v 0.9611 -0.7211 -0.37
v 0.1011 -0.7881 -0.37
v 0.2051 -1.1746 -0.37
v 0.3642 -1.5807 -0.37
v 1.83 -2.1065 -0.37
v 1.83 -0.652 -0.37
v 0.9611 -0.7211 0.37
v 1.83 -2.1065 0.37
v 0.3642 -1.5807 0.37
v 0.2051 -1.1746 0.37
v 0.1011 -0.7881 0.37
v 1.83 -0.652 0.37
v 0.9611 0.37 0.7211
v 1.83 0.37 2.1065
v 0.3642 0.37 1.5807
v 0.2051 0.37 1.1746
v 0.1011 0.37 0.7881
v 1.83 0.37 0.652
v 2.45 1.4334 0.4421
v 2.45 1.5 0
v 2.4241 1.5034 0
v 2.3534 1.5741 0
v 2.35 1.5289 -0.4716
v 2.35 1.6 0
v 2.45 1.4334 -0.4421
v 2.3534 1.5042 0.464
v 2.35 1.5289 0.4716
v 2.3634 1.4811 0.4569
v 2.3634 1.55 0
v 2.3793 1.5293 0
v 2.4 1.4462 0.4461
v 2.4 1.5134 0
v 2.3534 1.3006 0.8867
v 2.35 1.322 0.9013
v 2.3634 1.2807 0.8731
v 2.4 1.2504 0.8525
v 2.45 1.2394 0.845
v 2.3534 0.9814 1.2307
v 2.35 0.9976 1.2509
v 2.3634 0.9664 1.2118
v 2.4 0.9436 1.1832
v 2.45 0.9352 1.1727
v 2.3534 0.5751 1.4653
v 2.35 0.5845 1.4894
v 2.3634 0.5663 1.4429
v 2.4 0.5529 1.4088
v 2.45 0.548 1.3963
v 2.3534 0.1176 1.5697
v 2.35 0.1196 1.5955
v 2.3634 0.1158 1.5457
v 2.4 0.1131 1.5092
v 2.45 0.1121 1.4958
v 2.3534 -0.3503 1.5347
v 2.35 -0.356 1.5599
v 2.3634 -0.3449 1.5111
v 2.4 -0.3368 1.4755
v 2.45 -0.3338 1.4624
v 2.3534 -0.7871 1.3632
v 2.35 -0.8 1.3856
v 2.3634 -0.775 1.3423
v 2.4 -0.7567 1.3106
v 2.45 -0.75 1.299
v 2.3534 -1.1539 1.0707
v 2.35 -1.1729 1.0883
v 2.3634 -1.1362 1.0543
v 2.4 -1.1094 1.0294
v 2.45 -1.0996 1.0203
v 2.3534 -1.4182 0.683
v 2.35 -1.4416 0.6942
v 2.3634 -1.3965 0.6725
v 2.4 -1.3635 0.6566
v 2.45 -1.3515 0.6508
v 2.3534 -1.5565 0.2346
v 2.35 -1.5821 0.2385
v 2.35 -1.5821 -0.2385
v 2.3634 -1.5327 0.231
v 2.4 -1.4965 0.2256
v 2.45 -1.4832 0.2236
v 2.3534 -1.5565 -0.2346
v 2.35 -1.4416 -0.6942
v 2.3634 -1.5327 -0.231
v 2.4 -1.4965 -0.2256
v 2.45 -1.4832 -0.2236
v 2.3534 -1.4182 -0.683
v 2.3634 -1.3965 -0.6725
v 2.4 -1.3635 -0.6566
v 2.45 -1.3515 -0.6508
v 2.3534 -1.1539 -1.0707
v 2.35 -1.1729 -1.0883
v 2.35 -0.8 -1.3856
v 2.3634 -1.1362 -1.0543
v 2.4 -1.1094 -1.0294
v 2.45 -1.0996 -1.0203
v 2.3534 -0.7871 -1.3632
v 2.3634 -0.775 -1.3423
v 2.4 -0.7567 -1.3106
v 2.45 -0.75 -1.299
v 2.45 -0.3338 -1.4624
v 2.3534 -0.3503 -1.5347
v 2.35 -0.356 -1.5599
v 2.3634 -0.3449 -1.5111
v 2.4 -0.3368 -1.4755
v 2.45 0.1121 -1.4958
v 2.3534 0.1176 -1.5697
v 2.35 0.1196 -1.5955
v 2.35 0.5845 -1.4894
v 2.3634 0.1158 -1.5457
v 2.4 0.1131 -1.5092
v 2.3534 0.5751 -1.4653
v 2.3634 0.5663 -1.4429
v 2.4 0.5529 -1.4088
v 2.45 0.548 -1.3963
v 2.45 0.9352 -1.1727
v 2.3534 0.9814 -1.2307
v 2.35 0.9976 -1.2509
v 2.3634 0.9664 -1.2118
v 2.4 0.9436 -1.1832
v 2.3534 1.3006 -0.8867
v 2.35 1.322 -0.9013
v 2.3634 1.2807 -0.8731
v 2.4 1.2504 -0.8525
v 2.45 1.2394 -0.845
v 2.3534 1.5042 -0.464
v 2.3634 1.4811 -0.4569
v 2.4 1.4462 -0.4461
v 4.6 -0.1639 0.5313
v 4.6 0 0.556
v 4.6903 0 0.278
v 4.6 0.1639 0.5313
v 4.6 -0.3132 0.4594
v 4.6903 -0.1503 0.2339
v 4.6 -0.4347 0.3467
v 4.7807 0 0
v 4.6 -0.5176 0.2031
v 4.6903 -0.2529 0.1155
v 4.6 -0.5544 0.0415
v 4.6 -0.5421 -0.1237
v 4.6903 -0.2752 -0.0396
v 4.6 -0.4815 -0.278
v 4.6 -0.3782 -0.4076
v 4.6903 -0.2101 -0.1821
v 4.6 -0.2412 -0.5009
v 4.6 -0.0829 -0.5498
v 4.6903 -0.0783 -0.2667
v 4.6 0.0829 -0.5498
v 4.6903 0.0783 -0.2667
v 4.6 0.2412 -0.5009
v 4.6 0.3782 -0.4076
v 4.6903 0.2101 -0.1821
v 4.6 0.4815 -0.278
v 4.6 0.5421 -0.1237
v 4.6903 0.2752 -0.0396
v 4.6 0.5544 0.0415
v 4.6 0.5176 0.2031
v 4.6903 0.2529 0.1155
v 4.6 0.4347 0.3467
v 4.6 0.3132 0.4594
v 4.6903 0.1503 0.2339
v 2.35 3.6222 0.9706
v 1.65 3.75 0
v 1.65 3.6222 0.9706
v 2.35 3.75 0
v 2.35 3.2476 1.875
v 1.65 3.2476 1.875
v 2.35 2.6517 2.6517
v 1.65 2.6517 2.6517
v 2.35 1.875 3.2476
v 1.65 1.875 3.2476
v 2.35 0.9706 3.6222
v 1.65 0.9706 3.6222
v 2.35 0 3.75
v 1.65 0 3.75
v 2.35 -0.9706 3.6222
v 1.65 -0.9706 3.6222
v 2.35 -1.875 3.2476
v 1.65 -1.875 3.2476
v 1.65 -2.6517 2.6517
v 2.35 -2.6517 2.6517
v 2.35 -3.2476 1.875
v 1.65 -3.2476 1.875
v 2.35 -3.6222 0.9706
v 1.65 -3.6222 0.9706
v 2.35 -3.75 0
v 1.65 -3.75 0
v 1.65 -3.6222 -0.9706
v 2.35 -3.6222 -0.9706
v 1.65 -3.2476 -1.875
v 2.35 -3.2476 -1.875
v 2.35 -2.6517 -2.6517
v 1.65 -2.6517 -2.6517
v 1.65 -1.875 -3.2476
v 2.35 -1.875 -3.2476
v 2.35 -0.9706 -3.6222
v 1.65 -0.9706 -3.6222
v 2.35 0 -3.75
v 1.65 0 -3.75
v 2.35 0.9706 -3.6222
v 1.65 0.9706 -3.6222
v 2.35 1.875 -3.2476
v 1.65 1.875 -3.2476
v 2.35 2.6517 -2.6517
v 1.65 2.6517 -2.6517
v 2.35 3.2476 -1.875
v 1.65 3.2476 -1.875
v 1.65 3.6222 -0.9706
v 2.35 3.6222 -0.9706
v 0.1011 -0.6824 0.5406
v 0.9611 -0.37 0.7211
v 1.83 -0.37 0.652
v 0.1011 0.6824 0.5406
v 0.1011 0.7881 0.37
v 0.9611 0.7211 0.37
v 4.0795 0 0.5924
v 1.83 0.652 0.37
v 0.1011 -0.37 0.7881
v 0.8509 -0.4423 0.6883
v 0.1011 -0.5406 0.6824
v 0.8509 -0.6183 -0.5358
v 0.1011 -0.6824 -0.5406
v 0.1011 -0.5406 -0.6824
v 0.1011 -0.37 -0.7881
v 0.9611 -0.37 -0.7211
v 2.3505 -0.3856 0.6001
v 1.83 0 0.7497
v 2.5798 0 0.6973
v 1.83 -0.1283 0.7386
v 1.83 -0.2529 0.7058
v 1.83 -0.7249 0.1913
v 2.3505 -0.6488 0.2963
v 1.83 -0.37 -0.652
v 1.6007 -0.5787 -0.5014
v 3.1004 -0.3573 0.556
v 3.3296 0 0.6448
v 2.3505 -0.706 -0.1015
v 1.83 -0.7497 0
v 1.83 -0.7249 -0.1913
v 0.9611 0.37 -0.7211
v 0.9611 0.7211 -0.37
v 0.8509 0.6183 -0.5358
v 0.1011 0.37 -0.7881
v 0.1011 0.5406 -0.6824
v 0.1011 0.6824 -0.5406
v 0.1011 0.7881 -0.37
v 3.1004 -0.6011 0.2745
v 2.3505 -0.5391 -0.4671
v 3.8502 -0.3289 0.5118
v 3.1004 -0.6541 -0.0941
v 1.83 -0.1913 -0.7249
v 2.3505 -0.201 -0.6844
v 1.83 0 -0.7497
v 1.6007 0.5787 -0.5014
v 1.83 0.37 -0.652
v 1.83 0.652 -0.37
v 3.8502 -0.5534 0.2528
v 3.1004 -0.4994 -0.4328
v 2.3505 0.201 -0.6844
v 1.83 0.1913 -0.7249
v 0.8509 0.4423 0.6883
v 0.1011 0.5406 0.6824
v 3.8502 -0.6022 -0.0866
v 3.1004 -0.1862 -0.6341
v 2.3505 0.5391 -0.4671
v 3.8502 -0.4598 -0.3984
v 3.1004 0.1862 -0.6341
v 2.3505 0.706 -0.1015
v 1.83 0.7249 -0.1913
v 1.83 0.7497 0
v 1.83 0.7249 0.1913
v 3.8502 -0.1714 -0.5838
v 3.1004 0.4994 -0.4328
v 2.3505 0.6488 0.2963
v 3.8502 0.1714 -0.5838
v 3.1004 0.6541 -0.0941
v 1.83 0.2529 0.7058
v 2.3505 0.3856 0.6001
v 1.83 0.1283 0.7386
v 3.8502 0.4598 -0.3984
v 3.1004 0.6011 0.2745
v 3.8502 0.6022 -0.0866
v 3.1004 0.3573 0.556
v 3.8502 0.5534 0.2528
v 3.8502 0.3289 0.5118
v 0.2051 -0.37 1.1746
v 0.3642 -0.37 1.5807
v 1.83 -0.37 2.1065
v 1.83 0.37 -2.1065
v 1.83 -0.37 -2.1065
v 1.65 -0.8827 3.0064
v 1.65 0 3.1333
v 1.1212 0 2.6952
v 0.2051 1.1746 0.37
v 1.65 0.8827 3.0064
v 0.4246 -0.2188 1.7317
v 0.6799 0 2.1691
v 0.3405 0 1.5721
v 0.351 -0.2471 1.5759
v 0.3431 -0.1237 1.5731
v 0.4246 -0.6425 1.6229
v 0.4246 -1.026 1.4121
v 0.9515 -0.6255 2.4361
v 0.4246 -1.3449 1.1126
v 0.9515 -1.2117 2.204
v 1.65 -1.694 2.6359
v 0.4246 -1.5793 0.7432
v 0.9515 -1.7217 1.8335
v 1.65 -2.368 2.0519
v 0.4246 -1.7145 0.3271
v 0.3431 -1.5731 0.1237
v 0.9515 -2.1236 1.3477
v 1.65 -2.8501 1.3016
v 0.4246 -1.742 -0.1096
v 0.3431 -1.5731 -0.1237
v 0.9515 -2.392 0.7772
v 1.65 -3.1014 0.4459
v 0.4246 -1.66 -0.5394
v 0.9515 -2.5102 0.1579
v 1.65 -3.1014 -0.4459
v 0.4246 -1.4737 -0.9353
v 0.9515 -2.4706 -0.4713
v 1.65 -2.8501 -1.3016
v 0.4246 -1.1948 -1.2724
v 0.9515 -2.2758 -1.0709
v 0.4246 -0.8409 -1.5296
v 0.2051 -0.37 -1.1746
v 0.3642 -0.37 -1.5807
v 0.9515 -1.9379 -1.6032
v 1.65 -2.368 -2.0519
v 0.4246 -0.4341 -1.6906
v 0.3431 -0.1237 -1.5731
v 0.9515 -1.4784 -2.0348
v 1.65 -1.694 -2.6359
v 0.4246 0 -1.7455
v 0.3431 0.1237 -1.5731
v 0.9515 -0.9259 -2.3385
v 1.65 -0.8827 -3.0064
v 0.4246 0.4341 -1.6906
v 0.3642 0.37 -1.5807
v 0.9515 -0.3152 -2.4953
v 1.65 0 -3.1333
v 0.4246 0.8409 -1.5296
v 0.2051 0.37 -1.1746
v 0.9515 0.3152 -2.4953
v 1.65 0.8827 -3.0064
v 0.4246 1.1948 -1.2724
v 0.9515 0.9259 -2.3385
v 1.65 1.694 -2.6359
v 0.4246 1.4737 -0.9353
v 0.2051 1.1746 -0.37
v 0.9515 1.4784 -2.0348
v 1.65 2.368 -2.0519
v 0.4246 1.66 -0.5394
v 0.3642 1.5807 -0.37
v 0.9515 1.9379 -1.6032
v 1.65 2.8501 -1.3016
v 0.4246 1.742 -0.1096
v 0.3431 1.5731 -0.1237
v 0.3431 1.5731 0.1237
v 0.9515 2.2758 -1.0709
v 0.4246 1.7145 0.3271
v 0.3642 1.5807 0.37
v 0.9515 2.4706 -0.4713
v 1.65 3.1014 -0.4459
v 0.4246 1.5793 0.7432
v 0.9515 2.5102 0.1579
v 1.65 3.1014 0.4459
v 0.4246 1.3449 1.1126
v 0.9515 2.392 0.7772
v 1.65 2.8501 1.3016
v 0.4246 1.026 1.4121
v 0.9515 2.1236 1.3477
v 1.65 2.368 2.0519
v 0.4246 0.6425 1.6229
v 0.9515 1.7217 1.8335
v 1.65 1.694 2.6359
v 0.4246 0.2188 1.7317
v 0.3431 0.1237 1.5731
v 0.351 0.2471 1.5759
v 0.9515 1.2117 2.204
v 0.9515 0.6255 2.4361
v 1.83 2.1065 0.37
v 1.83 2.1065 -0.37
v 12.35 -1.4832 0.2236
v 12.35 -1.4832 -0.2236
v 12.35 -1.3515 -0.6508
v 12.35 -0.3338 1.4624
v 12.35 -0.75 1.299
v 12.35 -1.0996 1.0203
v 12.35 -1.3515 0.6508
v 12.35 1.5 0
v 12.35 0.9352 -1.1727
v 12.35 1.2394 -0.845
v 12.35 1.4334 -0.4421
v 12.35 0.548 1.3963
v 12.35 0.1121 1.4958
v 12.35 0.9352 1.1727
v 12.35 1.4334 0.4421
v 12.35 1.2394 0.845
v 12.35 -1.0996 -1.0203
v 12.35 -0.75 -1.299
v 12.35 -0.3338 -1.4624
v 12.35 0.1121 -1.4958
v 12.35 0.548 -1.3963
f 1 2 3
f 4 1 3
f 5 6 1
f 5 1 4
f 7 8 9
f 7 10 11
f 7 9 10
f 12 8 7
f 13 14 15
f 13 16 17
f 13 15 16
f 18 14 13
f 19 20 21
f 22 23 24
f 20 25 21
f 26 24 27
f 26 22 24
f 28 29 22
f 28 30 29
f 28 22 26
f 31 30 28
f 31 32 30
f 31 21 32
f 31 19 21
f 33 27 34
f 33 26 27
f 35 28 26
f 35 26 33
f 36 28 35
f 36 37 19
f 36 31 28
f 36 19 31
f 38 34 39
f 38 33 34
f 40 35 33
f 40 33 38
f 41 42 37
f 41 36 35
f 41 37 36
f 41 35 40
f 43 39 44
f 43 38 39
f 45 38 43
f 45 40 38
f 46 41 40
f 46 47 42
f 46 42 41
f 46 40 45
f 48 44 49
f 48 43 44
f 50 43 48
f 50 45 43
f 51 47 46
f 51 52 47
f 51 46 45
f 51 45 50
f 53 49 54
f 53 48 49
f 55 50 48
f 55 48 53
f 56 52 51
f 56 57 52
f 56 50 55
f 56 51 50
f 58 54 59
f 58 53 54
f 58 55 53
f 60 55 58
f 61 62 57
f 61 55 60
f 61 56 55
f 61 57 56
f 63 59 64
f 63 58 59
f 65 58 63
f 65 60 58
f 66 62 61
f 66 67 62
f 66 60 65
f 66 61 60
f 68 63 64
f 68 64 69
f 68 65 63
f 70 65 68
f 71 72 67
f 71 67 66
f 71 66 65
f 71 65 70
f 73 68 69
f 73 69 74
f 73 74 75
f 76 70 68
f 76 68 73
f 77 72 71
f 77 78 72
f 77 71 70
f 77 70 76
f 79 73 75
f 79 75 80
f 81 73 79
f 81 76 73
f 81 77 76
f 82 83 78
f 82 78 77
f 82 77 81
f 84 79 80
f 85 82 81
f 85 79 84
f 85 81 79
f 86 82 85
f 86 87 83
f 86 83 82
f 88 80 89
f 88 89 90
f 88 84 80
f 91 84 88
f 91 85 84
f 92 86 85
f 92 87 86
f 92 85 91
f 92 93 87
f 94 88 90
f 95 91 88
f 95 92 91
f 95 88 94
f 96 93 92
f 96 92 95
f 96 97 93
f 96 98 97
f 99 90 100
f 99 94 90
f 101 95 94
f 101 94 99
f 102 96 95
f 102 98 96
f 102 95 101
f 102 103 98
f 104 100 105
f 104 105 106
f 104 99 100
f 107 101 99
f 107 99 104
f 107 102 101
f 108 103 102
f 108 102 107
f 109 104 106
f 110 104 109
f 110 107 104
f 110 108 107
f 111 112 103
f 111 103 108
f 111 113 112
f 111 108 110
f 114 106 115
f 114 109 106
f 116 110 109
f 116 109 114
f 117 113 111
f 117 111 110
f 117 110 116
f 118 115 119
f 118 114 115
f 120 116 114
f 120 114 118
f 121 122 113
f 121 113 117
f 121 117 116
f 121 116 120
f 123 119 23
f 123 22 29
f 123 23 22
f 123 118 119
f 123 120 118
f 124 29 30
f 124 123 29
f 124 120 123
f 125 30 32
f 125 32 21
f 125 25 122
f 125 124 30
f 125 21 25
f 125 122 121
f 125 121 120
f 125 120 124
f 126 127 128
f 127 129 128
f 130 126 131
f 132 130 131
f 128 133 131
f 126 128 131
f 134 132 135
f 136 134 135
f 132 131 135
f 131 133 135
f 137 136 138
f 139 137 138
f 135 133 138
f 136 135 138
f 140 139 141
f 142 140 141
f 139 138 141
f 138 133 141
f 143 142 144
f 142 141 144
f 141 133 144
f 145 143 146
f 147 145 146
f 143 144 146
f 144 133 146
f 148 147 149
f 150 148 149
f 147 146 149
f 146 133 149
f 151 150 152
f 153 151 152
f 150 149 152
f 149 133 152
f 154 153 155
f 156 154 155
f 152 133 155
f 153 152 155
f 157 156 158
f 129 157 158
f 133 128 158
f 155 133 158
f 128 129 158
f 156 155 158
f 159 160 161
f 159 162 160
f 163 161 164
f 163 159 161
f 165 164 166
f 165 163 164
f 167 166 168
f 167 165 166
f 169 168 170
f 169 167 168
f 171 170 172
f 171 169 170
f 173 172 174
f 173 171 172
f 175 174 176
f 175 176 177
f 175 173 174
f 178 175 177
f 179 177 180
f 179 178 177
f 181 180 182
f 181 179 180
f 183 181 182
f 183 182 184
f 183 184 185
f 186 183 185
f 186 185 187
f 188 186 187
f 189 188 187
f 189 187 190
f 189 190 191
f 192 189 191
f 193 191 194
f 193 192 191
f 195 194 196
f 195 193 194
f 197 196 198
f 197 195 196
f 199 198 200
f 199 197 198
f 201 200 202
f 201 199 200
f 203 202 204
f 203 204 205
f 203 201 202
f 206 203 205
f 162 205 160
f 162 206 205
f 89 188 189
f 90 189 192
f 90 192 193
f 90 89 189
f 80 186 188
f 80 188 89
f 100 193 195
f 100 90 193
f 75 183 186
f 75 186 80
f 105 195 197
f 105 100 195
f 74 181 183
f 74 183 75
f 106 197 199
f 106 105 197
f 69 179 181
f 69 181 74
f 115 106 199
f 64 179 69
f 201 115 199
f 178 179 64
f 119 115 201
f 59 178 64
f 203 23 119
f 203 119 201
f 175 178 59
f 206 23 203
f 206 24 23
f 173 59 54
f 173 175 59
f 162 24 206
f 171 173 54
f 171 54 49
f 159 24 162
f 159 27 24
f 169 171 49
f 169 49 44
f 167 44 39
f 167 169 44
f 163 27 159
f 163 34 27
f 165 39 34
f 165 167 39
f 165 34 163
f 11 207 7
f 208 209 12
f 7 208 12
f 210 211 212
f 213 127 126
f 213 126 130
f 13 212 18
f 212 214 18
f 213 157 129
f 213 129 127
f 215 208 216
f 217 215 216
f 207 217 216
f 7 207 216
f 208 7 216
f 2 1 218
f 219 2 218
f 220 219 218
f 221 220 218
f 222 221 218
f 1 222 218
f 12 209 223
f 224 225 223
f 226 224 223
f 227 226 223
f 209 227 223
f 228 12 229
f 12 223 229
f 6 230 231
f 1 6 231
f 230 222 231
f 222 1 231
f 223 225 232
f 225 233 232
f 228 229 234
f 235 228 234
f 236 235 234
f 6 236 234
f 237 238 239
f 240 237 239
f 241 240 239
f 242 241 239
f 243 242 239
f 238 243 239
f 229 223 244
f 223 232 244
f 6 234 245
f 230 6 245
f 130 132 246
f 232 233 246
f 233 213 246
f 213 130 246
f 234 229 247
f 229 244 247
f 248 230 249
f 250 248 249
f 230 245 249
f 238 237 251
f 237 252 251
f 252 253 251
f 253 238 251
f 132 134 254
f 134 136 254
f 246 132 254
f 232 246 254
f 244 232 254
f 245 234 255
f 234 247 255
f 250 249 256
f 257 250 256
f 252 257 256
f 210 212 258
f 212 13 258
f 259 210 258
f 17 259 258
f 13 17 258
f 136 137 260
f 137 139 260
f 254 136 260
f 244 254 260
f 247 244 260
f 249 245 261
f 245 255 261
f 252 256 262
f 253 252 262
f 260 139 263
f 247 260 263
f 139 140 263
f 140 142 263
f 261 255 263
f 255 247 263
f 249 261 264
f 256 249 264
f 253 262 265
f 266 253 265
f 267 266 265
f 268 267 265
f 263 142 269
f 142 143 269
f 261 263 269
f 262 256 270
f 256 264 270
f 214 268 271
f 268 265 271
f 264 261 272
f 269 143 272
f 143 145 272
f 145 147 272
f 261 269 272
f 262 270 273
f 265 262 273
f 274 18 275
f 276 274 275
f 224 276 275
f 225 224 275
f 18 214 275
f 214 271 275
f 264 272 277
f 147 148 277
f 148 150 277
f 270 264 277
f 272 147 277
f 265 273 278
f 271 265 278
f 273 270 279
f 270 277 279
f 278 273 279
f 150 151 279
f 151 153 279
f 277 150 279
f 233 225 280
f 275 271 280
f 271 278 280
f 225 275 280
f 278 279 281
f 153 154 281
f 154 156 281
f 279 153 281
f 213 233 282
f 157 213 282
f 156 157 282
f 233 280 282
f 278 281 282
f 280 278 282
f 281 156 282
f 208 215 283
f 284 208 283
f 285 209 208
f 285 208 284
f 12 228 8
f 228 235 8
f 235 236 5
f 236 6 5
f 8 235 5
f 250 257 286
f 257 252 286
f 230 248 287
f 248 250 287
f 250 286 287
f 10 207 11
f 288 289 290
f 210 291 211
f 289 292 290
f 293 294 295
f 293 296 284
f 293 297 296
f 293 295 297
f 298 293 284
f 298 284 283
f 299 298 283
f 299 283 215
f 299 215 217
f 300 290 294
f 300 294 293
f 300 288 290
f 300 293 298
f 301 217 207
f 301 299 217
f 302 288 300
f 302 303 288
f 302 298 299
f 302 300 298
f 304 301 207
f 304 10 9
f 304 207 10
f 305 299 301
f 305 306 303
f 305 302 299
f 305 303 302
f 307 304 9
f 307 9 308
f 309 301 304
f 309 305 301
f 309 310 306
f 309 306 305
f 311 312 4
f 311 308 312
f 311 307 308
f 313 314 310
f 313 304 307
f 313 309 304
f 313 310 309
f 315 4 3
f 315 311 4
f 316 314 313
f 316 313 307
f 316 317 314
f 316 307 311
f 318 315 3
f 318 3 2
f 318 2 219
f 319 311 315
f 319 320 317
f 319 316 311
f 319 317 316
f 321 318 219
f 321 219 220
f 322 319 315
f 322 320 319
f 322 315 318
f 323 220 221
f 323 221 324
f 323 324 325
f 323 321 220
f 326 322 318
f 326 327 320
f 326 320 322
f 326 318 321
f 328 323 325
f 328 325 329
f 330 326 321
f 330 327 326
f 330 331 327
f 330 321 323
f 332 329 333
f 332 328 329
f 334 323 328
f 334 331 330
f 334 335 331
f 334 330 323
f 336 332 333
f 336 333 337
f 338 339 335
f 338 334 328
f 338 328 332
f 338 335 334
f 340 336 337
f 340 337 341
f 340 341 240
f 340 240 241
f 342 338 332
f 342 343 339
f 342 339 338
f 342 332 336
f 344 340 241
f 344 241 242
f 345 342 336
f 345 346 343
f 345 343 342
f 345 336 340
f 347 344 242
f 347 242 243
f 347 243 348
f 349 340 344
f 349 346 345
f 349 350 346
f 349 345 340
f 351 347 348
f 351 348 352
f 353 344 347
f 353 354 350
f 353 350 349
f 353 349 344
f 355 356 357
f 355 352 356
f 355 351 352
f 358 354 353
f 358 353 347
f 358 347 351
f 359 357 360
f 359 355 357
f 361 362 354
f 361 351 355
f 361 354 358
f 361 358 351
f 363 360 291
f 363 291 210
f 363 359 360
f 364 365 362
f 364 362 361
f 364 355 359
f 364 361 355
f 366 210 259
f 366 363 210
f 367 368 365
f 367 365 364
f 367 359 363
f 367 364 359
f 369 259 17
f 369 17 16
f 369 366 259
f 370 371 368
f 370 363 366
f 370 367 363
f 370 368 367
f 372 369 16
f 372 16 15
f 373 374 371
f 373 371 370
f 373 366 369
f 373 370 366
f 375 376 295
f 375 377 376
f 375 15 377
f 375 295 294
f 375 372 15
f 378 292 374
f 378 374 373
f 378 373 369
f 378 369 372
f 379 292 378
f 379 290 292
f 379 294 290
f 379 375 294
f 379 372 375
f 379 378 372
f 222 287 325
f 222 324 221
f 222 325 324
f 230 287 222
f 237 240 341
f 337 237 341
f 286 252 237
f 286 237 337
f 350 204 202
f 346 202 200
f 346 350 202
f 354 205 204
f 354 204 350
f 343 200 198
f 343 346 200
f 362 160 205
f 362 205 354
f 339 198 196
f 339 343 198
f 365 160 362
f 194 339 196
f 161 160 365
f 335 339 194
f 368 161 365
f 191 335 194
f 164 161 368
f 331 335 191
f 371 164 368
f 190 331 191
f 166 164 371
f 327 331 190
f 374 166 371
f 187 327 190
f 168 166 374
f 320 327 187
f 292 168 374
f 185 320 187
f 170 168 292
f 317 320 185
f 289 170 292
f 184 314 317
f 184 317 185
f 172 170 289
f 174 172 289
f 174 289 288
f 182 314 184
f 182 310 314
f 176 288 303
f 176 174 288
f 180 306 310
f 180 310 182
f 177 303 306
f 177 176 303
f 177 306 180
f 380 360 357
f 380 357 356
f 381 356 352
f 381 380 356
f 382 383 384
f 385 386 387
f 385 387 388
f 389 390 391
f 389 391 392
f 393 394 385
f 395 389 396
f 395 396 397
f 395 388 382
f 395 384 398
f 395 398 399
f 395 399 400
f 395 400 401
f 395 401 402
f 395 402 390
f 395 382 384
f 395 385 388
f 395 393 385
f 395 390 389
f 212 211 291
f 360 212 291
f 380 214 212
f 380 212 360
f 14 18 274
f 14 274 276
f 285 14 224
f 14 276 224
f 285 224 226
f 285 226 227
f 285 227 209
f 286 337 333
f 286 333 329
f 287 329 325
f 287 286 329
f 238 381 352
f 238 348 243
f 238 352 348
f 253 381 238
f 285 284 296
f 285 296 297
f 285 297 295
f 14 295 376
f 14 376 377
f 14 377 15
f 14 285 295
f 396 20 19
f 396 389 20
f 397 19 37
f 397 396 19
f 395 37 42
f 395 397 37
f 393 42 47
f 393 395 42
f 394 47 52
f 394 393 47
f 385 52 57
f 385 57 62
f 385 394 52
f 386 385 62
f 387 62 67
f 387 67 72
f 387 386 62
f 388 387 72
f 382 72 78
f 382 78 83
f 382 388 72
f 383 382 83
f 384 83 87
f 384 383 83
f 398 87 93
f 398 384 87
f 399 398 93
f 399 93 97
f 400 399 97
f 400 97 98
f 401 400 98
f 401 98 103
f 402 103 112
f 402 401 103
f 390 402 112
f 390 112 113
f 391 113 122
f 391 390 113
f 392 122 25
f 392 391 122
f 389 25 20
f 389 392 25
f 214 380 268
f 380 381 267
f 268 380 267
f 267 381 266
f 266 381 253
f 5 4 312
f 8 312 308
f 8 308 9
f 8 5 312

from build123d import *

# Parameters (mm, degrees)
RECPAT_COUNT = 2
RECPAT_ANGLE = 90


with BuildPart() as part:
    # Fillet1: read off the stored shape, not the designer's step
    # Fillet1 outline → Fillet1 (revolve)
    with BuildSketch(Plane.YX):
        with BuildLine():
            Line((1.5, 2.45), (1.5, 12.35))
            Line((1.5, 12.35), (0, 12.35))
            Line((0, 12.35), (0, 1.65))
            Line((0, 1.65), (3.75, 1.65))
            Line((3.75, 1.65), (3.75, 2.35))
            Line((3.75, 2.35), (1.6, 2.35))
            ThreePointArc((1.6, 2.35), (1.529289322, 2.379289322), (1.5, 2.45))
        make_face()
    revolve(axis=Axis((0, 0, 0), (1, 0, 0)))

    # PanSke → Pan (revolve)
    with BuildSketch(Plane.XY, mode=Mode.PRIVATE) as pan_sk:
        with BuildLine():
            Line((1.65, 3.133289007), (1.65, 0))
            Line((1.65, 0), (0, 0))
            ThreePointArc((0, 0), (0.437709114, 1.770593121), (1.65, 3.133289007))
        make_face()
    revolve(pan_sk.sketch.rotate(Axis((0, 0, 0), (1, 0, 0)), 90), axis=Axis((0, 0, 0), (1, 0, 0)))

    # Sketch3 → Recess section 0
    with BuildSketch(Plane(origin=(0, 0, 0), x_dir=(0, 0, -1), z_dir=(1, 0, 0))):
        with BuildLine():
            Line((-0.37, 1.45), (0.37, 1.45))
            Line((0.37, 1.45), (0.37, -1.45))
            Line((0.37, -1.45), (-0.37, -1.45))
            Line((-0.37, -1.45), (-0.37, 1.45))
        make_face()
    # Sketch4 → Recess section 1
    with BuildSketch(Plane(origin=(1.83, 0, 0), x_dir=(0, 0, -1), z_dir=(1, 0, 0))):
        with BuildLine():
            Line((-0.37, 2.106524682), (0.37, 2.106524682))
            Line((0.37, 2.106524682), (0.37, -2.106524682))
            Line((0.37, -2.106524682), (-0.37, -2.106524682))
            Line((-0.37, -2.106524682), (-0.37, 2.106524682))
        make_face()
    recess = loft(mode=Mode.SUBTRACT)

    # RecPat: Recess ×2 about axis
    recpat_axis = Axis((0, 0, 0), (1, 0, 0))
    for i in range(1, RECPAT_COUNT):
        add(recess.rotate(recpat_axis, i * RECPAT_ANGLE / (RECPAT_COUNT - 1)), mode=Mode.SUBTRACT)

    # RecCorSke → RecessCore (revolve, cut)
    with BuildSketch(Plane.XY, mode=Mode.PRIVATE) as recesscore_sk:
        Polygon((0, 0), (0, 0.877663335), (4.6, 0.556), (4.780655351, 0), align=None)
    revolve(recesscore_sk.sketch.rotate(Axis((-3.175, 0, 0), (1, 0, 0)), 90), axis=Axis((-3.175, 0, 0), (1, 0, 0)), mode=Mode.SUBTRACT)


solid = part.part
